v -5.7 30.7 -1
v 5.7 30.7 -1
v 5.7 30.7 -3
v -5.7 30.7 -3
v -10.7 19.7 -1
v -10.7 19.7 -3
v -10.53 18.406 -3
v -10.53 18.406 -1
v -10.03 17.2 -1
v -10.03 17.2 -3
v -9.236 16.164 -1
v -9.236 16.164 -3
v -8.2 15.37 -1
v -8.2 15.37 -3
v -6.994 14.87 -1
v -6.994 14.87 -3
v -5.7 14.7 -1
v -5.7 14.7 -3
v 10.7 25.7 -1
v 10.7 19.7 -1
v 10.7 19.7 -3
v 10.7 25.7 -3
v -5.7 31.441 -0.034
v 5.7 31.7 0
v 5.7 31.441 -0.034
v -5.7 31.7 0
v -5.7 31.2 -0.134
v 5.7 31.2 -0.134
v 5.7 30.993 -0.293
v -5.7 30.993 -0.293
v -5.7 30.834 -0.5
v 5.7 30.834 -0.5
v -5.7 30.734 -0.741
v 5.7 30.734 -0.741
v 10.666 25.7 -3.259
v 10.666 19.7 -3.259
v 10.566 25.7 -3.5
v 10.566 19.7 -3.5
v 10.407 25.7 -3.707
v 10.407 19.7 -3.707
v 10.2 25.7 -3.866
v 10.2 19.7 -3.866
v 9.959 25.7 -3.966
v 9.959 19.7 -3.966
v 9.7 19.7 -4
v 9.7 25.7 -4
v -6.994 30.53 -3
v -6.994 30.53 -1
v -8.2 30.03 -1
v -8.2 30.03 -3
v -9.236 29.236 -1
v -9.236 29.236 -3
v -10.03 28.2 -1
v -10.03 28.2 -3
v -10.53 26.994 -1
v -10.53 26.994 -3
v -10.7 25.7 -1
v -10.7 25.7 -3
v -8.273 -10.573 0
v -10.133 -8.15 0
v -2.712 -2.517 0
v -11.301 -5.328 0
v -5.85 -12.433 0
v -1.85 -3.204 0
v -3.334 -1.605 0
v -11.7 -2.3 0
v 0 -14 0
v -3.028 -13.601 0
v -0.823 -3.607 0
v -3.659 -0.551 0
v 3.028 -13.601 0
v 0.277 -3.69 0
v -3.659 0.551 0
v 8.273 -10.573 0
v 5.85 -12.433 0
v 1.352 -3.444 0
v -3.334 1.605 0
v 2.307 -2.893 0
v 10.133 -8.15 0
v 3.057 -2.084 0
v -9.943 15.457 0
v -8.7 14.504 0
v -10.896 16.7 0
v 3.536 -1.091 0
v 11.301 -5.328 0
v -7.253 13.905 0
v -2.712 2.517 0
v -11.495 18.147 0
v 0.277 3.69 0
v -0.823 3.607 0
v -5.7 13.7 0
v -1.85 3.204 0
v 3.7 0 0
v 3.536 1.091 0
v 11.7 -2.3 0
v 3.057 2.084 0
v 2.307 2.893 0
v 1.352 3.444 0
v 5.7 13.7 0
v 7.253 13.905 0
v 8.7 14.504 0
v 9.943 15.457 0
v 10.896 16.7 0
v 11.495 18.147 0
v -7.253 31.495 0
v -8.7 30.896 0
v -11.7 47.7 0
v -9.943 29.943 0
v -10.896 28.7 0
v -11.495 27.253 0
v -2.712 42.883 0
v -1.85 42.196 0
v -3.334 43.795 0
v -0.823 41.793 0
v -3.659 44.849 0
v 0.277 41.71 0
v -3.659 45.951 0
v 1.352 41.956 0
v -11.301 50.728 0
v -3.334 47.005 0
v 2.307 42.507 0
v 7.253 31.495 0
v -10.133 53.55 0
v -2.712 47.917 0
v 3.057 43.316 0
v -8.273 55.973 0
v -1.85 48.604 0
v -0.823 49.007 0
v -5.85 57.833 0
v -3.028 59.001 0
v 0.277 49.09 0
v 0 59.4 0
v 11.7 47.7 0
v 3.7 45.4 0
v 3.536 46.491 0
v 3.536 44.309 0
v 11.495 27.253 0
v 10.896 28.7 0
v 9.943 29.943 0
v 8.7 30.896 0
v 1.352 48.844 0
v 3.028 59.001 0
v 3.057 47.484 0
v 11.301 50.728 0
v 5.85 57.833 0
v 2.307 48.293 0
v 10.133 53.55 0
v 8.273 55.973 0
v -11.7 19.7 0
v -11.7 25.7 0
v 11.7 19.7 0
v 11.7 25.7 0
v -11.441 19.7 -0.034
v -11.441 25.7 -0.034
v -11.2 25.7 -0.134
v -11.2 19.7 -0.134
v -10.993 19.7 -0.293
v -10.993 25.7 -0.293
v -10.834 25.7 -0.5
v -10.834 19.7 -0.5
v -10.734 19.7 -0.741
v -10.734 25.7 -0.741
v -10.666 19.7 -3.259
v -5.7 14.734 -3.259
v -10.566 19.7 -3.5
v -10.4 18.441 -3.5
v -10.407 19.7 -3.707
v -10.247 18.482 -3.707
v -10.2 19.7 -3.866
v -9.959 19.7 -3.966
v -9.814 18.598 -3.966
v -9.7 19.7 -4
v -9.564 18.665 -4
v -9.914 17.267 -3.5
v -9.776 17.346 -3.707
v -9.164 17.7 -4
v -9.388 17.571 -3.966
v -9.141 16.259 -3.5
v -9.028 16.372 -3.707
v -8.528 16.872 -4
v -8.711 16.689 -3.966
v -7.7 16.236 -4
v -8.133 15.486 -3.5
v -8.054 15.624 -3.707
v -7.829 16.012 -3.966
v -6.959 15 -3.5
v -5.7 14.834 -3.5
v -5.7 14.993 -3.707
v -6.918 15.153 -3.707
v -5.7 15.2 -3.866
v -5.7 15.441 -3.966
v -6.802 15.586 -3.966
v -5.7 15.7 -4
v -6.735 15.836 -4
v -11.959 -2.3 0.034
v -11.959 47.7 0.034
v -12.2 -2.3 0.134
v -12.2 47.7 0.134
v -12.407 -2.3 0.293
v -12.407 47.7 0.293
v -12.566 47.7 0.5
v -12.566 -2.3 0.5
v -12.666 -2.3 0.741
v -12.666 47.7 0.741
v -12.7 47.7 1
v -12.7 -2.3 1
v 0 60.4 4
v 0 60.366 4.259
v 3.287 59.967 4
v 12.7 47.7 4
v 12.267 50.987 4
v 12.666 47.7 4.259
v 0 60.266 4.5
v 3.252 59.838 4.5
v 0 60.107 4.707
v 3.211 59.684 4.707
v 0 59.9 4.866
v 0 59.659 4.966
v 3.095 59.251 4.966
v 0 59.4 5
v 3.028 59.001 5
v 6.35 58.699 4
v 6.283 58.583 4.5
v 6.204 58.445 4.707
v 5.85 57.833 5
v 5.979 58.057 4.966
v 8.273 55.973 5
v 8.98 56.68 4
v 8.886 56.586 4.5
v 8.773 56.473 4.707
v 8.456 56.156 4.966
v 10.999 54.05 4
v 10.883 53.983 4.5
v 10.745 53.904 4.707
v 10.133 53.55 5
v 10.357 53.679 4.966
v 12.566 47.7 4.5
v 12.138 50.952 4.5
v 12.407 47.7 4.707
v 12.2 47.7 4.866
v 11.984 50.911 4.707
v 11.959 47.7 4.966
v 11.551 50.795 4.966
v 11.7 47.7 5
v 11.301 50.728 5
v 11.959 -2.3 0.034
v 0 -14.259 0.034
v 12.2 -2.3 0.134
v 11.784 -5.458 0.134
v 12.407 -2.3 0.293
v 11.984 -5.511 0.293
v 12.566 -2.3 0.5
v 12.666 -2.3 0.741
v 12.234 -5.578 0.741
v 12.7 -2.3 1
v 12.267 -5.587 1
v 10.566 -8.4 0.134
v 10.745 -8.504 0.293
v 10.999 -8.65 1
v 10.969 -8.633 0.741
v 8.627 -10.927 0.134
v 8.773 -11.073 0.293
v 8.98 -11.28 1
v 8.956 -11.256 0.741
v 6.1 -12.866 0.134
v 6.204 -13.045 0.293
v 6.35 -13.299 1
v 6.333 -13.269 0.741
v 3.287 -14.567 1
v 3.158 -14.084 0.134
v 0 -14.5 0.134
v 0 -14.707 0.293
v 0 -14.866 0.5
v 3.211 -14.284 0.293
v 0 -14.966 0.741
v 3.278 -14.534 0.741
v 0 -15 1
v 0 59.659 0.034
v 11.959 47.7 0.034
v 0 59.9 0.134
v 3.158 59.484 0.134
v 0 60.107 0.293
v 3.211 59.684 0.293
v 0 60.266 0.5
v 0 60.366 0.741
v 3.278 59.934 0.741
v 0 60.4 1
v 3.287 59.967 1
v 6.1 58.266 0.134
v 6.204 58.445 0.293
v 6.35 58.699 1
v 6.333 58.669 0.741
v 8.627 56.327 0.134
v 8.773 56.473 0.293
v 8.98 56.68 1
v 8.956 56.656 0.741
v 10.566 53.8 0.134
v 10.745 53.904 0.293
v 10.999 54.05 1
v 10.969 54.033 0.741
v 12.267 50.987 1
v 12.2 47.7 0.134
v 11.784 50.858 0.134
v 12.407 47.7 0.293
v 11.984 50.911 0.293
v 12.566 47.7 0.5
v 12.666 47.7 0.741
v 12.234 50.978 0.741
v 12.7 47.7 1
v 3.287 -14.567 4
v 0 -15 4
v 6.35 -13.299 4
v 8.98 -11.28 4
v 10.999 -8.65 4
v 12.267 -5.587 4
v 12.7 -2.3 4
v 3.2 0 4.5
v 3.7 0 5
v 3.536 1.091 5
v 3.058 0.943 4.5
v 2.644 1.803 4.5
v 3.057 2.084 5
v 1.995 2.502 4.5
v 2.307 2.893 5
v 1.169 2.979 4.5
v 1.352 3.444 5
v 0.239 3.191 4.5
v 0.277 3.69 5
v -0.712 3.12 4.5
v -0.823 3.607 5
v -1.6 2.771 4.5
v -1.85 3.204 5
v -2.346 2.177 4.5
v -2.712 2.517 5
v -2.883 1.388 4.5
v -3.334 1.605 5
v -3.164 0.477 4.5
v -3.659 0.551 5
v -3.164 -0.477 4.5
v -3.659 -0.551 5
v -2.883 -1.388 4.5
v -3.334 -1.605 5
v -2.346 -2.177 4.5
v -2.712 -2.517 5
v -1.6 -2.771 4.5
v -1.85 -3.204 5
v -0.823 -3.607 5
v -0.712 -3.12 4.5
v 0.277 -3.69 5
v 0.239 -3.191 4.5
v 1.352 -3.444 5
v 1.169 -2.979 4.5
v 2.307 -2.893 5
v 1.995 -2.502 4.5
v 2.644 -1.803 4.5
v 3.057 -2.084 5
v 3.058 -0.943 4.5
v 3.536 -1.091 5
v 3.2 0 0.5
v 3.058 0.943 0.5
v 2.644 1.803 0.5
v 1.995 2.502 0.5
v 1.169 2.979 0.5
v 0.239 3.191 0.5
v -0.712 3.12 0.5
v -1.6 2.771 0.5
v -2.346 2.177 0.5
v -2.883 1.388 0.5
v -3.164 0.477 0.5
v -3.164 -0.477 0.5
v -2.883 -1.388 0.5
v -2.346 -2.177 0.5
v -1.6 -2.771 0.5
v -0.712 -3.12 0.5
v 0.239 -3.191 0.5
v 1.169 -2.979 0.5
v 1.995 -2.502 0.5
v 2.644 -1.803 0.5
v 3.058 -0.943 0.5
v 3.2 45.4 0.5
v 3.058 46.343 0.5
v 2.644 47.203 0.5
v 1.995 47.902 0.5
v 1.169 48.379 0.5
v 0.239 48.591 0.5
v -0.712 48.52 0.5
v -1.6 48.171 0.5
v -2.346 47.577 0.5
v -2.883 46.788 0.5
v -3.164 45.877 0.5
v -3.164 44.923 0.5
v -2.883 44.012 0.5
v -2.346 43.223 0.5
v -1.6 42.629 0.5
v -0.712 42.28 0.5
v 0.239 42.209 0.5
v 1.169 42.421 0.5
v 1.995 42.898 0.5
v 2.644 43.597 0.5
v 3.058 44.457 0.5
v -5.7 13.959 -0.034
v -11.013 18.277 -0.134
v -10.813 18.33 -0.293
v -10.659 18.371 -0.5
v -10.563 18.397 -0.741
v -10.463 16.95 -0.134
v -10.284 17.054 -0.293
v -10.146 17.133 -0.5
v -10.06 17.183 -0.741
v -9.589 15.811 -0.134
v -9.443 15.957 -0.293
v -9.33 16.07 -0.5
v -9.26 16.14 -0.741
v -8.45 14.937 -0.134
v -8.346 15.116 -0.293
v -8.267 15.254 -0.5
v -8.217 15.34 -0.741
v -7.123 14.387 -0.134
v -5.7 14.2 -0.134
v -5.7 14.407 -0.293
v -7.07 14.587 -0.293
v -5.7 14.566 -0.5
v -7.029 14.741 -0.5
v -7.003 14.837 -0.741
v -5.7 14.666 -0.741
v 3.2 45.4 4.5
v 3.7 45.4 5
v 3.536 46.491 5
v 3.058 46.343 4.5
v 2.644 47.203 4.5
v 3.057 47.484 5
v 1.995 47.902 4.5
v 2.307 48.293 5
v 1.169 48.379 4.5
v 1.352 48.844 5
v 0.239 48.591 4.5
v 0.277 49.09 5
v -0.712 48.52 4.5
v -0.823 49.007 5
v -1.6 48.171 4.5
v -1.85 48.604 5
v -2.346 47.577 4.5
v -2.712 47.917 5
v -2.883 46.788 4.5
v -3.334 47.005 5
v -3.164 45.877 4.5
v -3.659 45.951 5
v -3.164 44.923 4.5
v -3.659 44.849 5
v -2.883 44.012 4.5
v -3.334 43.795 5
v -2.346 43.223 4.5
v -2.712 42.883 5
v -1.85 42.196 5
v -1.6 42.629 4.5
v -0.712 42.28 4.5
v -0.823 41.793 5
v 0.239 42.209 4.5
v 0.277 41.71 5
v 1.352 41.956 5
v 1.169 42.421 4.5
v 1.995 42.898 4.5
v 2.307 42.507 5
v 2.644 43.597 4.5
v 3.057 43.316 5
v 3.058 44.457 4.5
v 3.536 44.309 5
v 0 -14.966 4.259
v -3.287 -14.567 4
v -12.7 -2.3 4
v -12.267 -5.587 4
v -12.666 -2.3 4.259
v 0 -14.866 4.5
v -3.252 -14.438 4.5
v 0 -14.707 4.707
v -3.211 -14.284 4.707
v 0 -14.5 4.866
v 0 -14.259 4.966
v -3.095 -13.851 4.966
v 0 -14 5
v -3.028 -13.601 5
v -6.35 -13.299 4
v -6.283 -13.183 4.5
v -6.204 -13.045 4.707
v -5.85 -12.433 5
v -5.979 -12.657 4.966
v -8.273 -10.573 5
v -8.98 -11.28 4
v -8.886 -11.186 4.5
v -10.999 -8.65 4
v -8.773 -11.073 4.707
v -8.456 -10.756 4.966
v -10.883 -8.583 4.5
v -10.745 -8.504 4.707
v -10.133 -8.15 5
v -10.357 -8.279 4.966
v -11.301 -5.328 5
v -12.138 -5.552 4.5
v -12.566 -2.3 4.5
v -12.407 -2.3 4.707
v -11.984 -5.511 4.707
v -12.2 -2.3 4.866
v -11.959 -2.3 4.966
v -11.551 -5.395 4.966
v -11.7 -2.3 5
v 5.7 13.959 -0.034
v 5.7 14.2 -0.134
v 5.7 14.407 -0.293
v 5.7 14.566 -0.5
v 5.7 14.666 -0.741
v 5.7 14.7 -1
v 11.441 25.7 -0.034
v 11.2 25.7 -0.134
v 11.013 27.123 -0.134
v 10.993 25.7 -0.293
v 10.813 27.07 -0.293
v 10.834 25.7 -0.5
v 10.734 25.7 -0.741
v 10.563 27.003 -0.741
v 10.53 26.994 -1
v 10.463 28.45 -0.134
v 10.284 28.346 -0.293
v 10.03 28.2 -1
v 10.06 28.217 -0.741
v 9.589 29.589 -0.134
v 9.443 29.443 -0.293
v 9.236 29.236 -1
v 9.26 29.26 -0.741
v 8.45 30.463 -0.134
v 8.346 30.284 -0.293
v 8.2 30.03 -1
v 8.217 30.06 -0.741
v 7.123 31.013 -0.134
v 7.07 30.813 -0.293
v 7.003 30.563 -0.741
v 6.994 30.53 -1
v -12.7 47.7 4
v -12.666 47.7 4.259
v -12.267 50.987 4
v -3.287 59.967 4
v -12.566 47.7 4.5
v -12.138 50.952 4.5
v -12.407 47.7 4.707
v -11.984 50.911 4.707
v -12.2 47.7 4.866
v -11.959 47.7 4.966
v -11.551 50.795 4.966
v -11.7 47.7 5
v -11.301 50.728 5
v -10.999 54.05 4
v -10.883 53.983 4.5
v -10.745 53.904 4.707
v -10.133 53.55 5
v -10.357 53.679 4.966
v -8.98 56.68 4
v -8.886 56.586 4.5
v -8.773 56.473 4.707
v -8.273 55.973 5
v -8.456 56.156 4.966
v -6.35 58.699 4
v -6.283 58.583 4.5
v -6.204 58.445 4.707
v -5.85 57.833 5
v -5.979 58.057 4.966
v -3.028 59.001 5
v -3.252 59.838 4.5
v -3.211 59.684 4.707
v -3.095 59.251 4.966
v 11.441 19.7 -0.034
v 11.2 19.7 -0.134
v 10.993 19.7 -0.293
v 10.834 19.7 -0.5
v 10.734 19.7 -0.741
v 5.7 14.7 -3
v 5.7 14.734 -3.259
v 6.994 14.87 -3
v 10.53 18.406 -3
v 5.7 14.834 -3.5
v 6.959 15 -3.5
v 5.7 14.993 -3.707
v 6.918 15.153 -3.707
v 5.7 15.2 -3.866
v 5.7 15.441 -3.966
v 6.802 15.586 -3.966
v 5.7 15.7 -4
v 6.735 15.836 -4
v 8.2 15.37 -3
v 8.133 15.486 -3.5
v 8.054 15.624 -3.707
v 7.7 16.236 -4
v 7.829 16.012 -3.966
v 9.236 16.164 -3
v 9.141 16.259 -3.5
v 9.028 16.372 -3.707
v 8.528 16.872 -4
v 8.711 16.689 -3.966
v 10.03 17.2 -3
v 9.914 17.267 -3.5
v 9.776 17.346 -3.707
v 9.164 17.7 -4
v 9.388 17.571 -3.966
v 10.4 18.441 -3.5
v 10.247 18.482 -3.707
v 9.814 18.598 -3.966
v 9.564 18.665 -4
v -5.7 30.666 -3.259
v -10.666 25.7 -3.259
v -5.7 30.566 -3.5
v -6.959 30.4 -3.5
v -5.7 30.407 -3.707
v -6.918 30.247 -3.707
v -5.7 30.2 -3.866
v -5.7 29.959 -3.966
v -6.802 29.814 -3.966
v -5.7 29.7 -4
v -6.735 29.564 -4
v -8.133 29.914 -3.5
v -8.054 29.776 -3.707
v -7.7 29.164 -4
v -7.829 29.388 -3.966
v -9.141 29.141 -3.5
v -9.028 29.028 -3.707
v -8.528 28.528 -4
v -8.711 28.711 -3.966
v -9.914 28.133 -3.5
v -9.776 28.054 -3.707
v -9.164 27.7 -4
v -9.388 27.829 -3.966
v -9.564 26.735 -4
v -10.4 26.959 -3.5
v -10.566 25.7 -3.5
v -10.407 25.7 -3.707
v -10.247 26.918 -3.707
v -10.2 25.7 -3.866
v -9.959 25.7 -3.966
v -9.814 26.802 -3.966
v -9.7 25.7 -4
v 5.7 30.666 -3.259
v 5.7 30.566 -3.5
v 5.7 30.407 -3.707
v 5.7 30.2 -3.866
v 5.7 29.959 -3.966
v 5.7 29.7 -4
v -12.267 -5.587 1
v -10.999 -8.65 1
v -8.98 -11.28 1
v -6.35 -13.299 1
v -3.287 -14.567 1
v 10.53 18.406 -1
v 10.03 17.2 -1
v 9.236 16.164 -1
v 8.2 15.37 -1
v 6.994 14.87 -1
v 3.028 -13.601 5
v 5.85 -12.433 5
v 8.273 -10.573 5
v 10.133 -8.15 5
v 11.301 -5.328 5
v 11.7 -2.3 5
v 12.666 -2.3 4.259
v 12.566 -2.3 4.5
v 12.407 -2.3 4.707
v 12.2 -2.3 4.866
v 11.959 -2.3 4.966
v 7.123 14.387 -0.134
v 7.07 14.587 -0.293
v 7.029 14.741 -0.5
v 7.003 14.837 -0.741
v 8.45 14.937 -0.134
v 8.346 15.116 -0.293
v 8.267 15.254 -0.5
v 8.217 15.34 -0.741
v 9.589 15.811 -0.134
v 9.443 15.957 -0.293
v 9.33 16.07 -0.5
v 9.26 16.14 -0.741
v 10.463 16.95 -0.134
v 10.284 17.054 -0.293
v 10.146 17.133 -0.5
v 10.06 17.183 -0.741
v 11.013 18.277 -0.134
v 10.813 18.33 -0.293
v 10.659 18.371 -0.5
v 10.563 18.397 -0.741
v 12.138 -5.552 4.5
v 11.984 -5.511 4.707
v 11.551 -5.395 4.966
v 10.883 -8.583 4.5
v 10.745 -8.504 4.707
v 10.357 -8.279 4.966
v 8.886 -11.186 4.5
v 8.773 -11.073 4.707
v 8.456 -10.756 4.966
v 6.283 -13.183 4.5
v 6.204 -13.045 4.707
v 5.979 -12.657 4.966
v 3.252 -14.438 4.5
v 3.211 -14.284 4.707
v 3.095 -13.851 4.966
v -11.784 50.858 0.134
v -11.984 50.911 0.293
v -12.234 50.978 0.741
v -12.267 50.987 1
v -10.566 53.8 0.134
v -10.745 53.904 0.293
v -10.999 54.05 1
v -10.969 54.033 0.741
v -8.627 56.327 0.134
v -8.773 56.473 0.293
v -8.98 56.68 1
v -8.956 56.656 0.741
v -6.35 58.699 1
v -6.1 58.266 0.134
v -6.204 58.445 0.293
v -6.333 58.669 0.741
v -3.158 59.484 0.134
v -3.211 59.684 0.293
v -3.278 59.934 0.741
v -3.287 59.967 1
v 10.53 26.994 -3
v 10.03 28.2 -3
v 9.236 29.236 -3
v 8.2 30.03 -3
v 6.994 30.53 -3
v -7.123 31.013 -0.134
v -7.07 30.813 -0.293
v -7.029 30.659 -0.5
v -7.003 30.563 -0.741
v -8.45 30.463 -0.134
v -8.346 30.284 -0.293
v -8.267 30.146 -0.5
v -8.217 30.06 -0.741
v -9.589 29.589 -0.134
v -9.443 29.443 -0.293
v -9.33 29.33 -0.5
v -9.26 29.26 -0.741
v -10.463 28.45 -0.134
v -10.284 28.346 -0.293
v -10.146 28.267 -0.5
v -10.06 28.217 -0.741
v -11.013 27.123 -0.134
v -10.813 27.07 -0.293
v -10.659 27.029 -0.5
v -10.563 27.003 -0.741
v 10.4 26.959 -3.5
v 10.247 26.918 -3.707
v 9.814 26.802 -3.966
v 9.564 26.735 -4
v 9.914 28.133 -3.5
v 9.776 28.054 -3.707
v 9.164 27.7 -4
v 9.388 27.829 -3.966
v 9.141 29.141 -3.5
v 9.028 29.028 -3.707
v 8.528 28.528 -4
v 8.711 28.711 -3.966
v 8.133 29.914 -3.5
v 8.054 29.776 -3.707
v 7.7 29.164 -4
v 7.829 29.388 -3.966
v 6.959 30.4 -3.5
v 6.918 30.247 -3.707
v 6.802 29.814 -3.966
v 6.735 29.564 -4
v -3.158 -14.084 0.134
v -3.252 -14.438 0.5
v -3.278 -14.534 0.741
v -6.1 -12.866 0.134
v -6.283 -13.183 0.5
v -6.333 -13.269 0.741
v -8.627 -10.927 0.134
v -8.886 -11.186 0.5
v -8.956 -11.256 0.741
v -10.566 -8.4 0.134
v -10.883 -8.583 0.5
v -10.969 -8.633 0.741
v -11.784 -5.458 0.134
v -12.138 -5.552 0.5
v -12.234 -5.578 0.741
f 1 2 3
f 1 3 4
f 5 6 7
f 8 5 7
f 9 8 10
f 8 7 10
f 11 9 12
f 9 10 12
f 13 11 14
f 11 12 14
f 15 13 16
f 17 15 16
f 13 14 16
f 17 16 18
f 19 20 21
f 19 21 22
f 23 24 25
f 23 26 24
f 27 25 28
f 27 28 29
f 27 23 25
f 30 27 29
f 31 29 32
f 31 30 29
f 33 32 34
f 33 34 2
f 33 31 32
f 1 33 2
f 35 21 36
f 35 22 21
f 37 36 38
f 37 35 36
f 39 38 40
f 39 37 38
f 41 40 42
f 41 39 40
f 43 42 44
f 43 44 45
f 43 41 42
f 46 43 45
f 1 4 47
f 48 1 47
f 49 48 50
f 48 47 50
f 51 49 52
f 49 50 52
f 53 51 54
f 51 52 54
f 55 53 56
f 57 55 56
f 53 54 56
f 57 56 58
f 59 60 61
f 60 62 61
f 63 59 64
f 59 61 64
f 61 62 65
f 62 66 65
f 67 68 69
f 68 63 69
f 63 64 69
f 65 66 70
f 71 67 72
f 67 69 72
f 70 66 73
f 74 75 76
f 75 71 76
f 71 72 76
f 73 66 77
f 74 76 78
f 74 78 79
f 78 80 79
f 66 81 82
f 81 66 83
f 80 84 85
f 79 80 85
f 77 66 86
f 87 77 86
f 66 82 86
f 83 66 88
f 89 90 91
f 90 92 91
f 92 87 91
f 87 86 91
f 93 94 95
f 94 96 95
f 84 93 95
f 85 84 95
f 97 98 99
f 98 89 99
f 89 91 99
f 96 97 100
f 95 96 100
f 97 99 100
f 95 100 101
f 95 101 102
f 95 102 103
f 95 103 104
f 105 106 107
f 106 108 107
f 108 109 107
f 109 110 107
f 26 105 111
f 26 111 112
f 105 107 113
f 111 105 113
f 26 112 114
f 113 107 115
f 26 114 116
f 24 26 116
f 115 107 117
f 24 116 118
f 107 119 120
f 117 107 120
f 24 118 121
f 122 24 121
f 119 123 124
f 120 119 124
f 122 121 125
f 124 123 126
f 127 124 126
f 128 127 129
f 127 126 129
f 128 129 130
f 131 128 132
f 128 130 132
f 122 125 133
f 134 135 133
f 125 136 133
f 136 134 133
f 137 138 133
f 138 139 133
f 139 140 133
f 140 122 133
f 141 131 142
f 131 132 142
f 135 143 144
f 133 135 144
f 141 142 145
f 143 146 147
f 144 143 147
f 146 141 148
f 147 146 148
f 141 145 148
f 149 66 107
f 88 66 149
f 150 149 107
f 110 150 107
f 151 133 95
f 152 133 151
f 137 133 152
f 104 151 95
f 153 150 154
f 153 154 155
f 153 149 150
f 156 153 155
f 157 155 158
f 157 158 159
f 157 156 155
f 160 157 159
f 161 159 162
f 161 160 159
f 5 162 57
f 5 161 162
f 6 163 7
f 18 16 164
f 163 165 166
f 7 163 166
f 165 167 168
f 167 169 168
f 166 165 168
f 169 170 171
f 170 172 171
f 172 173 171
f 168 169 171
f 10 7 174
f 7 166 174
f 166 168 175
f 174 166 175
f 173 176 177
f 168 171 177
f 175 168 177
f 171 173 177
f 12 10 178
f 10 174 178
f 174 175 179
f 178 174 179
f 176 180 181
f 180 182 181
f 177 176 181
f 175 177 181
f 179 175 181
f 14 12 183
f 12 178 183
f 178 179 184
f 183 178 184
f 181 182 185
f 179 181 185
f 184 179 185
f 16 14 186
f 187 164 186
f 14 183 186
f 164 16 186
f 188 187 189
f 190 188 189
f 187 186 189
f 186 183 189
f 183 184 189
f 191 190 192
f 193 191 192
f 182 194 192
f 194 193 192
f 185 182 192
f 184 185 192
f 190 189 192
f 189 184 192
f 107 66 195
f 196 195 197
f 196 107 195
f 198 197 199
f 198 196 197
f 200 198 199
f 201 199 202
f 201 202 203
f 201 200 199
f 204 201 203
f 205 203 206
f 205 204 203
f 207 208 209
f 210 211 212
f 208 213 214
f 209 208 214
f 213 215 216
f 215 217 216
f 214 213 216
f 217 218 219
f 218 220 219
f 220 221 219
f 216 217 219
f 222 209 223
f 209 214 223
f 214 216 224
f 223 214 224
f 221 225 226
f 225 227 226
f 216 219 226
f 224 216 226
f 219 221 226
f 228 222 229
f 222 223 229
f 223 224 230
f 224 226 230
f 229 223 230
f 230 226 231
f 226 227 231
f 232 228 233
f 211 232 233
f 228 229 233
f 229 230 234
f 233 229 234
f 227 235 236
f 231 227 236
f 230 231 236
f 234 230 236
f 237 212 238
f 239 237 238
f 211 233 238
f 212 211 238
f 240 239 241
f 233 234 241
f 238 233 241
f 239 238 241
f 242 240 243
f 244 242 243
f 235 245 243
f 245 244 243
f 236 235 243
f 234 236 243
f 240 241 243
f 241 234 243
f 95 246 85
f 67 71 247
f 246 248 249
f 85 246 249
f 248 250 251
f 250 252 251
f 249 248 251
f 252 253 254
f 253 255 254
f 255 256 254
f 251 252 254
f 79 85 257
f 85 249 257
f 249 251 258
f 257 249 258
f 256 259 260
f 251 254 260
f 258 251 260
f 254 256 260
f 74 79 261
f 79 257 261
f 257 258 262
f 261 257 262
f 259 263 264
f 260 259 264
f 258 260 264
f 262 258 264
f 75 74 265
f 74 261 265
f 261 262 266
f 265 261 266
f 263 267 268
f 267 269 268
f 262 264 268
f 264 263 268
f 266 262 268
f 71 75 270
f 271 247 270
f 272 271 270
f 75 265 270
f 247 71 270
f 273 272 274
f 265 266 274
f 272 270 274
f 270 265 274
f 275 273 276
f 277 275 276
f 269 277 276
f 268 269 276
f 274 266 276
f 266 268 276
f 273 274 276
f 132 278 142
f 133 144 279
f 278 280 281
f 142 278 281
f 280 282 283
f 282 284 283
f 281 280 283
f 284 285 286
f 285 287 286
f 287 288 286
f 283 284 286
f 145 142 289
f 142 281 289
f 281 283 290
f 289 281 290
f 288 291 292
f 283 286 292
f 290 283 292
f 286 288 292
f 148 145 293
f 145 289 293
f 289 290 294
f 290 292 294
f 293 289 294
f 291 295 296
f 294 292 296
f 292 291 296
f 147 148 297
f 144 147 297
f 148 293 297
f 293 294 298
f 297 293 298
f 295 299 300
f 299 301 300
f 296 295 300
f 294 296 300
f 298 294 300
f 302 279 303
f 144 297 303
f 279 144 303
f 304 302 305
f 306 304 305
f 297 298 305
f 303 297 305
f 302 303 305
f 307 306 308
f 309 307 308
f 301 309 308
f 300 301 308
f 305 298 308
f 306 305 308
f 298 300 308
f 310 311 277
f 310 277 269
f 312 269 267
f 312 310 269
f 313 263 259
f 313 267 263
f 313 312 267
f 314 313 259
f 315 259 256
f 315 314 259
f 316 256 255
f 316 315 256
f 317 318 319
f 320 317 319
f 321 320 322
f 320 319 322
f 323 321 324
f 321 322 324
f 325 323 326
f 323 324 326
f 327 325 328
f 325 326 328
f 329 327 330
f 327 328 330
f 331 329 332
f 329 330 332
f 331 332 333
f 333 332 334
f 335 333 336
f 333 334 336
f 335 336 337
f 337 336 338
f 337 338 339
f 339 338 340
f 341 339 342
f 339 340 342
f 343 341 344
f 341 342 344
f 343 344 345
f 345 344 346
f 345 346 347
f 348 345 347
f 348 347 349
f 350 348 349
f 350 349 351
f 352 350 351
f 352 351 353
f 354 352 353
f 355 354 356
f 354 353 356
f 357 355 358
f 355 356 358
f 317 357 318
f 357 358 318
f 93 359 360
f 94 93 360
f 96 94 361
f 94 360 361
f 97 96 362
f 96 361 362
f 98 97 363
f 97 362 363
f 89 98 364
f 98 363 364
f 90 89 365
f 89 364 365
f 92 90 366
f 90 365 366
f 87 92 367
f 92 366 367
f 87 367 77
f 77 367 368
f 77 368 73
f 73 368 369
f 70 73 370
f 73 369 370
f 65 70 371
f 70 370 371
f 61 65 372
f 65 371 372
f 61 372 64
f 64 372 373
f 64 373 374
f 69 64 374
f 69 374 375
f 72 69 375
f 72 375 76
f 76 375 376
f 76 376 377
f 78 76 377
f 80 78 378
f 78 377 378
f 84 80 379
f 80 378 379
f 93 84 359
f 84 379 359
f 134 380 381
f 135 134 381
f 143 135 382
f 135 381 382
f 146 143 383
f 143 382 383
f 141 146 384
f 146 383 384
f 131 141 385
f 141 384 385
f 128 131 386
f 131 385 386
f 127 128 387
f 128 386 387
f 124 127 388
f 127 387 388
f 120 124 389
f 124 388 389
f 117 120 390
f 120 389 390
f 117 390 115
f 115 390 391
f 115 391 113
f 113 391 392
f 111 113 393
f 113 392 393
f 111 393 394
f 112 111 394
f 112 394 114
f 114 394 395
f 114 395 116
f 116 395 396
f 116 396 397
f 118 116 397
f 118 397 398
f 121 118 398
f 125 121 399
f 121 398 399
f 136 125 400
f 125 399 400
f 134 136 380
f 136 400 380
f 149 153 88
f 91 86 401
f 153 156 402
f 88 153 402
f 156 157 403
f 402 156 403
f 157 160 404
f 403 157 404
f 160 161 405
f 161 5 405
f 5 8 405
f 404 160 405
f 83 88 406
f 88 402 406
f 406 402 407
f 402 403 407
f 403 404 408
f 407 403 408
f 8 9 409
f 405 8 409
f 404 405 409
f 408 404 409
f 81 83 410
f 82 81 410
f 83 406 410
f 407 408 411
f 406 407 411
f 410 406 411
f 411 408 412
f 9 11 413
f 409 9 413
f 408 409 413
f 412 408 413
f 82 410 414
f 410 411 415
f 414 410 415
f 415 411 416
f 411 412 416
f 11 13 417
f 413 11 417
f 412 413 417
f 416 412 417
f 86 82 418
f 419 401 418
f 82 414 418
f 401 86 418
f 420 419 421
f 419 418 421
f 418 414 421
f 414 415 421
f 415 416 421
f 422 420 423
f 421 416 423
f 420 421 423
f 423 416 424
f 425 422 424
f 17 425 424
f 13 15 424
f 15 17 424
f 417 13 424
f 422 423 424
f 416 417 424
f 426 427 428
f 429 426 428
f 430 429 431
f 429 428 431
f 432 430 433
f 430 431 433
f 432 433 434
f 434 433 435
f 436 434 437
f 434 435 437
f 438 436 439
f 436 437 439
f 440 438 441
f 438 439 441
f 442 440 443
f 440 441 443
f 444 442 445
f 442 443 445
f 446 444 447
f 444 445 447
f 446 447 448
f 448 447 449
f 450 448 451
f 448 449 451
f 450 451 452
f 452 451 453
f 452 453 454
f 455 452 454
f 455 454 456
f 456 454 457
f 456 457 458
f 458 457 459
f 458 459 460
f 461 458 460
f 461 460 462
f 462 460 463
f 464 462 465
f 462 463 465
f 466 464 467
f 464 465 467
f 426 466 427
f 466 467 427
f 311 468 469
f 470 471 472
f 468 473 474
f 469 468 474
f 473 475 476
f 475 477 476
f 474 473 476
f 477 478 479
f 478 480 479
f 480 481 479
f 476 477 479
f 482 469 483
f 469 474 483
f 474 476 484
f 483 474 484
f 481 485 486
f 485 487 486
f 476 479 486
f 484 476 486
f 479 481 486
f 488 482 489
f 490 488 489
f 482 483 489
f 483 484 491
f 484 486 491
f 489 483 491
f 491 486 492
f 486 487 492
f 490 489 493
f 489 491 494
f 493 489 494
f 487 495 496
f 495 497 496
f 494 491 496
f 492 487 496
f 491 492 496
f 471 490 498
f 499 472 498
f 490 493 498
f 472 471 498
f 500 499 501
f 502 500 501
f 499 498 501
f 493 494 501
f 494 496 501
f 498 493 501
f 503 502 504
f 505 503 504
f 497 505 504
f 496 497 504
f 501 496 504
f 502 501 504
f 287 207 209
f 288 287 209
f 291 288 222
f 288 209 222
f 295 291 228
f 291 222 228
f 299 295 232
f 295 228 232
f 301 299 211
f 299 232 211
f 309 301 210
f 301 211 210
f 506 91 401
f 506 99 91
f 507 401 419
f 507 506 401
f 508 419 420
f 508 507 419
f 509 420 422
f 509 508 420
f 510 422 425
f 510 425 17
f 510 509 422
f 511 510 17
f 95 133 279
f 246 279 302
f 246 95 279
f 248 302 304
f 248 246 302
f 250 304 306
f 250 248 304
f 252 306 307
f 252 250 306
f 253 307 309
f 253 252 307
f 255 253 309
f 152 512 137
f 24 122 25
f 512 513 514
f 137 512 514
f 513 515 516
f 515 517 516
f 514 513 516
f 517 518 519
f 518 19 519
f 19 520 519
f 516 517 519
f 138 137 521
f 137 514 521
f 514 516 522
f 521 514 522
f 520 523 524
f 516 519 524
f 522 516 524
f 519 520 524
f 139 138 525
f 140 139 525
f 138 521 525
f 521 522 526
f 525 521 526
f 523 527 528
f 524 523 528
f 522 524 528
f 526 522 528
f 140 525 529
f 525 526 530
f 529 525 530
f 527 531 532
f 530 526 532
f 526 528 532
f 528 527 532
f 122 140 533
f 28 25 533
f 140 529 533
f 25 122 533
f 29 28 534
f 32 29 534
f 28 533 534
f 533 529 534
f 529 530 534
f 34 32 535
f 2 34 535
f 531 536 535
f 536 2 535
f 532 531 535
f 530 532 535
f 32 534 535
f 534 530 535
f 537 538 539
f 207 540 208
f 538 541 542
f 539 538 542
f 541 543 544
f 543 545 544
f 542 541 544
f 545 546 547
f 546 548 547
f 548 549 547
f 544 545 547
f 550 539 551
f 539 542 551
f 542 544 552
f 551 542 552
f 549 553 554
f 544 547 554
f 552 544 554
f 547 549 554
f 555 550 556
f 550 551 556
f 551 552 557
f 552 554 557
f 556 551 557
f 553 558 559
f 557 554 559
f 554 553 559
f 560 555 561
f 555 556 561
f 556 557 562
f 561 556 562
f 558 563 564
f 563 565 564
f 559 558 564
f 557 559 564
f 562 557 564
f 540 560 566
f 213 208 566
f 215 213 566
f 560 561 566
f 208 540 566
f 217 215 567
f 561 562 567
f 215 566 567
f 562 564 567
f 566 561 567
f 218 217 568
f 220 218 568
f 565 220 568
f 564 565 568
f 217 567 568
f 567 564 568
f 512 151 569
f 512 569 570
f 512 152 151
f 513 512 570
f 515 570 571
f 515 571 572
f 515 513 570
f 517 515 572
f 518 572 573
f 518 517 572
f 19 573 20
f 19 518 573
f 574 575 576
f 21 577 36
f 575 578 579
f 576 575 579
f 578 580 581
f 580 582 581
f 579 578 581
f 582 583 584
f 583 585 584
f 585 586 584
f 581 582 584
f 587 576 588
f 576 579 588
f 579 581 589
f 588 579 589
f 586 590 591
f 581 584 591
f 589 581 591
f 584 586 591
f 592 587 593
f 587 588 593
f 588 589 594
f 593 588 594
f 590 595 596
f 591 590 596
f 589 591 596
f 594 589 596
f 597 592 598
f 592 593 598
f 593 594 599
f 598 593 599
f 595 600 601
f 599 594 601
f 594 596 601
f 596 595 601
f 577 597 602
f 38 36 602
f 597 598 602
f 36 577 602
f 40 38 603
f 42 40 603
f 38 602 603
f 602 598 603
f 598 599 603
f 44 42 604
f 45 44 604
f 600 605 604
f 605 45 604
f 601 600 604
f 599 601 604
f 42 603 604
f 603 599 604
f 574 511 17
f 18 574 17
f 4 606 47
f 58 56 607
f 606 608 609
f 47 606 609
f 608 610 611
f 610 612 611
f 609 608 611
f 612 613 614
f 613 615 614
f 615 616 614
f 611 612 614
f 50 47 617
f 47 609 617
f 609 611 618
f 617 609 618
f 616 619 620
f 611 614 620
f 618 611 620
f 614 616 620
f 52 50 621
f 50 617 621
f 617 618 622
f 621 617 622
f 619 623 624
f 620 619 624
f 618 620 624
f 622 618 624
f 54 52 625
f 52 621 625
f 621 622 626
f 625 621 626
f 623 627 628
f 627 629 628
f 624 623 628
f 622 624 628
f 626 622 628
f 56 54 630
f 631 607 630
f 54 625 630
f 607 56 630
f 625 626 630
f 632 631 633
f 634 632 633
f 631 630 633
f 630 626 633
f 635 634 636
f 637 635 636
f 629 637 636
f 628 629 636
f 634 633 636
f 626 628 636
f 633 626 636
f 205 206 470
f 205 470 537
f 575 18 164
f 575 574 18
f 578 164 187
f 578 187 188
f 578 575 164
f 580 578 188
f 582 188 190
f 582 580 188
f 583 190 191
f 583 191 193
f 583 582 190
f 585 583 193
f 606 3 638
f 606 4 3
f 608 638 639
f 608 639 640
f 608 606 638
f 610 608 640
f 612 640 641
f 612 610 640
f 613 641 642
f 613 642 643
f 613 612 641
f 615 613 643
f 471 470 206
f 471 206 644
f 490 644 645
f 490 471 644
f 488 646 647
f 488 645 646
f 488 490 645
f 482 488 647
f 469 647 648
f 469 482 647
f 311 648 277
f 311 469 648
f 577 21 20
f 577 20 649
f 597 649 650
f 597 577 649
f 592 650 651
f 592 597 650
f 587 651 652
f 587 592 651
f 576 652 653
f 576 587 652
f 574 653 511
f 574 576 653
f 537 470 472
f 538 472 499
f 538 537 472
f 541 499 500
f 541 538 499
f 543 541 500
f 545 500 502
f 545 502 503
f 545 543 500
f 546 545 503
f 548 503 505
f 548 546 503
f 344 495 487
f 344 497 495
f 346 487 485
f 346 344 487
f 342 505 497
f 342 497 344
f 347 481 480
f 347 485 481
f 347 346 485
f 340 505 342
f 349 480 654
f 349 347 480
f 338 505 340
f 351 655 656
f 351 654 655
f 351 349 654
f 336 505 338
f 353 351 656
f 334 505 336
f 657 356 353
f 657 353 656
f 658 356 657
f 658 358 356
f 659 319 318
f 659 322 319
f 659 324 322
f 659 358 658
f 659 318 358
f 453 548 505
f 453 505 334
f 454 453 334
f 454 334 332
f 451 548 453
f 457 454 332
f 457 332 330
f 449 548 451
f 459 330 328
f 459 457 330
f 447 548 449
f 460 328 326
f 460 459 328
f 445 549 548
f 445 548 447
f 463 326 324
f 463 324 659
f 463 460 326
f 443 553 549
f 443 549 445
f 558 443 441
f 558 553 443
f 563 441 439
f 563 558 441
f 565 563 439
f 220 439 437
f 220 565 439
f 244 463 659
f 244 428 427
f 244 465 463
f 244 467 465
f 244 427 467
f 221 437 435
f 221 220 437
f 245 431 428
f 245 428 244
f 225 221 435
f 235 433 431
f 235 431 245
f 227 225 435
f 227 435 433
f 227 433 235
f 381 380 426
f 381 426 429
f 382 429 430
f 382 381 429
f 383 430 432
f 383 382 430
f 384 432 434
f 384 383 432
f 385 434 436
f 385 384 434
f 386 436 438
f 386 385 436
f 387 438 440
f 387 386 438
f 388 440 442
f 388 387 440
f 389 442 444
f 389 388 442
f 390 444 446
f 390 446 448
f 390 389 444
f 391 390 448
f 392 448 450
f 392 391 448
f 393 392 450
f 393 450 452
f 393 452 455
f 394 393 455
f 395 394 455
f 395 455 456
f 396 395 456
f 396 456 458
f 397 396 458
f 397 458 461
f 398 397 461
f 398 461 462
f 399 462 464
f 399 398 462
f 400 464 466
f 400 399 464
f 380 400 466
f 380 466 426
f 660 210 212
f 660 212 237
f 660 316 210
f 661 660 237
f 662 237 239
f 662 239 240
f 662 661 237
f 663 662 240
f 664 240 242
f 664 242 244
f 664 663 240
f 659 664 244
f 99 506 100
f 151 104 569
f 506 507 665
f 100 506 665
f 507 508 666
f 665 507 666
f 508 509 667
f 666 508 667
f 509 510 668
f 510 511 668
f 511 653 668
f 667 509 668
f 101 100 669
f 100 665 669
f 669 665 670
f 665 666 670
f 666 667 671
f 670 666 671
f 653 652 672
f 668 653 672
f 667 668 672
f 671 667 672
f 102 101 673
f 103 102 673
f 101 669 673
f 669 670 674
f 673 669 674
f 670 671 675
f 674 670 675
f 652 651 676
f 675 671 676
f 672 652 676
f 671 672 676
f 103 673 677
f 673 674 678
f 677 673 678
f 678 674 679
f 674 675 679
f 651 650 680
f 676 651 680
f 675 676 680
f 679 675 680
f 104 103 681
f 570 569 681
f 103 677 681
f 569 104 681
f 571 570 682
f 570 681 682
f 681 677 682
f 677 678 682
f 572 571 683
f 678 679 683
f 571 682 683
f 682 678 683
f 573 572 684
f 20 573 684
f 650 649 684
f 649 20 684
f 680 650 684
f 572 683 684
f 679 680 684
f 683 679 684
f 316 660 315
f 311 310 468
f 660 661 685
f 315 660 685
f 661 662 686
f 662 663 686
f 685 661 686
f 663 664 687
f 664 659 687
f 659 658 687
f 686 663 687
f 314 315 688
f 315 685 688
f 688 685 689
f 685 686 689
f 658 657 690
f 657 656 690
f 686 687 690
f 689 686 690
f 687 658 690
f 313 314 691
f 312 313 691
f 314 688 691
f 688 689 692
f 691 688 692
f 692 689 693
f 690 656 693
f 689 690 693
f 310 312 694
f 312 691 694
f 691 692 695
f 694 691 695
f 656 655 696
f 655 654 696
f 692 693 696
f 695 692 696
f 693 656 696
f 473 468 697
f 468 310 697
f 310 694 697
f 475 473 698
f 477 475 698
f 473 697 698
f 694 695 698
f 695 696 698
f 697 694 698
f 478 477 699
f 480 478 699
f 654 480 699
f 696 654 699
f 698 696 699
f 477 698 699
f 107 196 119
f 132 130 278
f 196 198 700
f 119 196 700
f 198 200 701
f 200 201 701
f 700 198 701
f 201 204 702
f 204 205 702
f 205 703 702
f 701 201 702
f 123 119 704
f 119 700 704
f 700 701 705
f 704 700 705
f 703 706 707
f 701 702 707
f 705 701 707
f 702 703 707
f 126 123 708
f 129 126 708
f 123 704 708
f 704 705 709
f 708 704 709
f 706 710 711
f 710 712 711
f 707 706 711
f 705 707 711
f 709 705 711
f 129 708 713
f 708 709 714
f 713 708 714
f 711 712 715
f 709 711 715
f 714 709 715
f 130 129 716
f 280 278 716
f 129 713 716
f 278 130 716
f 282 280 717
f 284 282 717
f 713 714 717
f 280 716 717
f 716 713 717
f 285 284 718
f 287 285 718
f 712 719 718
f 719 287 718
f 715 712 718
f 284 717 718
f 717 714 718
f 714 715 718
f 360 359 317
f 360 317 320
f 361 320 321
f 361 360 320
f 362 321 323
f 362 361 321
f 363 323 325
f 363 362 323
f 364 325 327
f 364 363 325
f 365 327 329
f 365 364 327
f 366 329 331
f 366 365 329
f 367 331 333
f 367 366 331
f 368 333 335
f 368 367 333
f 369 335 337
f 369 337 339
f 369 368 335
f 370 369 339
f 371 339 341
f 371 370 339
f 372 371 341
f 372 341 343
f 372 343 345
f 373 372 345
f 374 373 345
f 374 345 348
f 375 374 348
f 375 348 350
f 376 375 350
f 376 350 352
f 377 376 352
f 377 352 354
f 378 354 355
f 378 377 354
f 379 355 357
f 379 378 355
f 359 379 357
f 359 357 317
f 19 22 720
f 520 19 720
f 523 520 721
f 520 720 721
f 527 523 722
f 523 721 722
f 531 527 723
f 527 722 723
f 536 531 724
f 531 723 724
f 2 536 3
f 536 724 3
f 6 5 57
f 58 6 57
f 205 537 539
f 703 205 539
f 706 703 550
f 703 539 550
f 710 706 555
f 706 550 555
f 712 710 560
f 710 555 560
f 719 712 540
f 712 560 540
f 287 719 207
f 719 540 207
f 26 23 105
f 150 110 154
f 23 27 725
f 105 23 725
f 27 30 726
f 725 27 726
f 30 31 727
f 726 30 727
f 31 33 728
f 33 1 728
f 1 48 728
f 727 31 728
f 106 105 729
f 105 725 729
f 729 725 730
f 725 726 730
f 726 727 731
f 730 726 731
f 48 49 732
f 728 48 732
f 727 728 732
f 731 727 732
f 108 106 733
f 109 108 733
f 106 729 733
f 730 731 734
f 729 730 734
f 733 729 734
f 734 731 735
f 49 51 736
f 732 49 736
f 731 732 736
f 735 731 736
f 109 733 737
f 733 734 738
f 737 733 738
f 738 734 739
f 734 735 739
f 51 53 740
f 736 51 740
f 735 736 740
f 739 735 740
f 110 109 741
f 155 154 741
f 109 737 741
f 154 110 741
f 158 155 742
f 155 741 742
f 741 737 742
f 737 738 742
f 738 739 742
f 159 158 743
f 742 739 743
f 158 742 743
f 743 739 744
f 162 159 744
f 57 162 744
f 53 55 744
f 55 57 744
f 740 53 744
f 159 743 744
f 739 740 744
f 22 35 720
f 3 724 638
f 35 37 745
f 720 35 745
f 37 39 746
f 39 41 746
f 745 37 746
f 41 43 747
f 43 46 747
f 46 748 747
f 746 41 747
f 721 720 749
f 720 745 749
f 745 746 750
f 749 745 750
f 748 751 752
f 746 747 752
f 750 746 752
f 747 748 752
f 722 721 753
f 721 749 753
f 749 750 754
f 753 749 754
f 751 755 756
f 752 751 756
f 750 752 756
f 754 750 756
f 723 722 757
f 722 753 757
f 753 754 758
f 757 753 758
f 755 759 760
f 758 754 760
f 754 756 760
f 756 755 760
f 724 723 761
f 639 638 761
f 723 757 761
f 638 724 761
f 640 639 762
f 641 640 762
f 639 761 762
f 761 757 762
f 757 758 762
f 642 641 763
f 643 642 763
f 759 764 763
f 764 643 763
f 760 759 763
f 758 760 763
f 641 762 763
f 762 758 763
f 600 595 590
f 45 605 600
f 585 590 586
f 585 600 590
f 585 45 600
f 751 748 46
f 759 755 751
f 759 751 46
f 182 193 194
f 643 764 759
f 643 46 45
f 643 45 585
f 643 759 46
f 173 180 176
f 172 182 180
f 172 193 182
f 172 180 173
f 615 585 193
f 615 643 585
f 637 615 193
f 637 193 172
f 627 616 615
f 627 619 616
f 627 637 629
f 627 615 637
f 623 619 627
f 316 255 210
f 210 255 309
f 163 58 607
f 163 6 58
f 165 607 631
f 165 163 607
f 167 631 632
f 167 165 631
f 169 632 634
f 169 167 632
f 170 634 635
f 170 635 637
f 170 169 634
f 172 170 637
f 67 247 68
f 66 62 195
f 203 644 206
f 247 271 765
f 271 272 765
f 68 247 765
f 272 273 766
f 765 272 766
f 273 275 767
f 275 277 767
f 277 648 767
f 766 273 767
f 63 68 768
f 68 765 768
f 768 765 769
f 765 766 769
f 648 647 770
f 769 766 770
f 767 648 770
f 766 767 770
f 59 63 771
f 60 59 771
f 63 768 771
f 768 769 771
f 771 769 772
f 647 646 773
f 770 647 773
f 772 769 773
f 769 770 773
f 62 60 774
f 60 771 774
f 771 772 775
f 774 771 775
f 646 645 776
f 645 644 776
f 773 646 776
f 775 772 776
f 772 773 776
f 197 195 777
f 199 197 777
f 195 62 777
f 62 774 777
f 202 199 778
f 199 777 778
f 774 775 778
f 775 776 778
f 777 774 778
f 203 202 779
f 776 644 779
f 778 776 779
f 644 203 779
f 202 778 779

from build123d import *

# Parameters (mm, degrees)
SKETCH1_W        = 25.4
SKETCH1_H        = 75.4
SKETCH1_R        = 3.2
MAINBODY_DEPTH   = 5
SKETCH2_W        = 21.4
SKETCH2_H        = 16
RIBSUPPORT_DEPTH = 4
FILLET_12_7_R    = 12.7
FILLET_5_0_R     = 5
CHAMFER_0_5_SIZE = 0.5
FILLET_1_0_R     = 1


with BuildPart() as part:
    # Sketch1 → mainBody (new body)
    with BuildSketch(Plane.XY):
        with Locations((0, 22.7)):
            Rectangle(SKETCH1_W, SKETCH1_H)
        Circle(SKETCH1_R, mode=Mode.SUBTRACT)
        with Locations((0, 45.4)):
            Circle(SKETCH1_R, mode=Mode.SUBTRACT)
    extrude(amount=MAINBODY_DEPTH)

    # Sketch2 → ribSupport (add)
    with BuildSketch(Plane(origin=(0, 0, 0), x_dir=(-1, 0, 0), z_dir=(0, 0, -1))):
        with Locations((0, 22.7)):
            Rectangle(SKETCH2_W, SKETCH2_H)
    extrude(amount=RIBSUPPORT_DEPTH)

    # Fillet-12.7
    fillet_12_7_edges = [part.edges().sort_by_distance(p)[0] for p in [
        (-12.7, -15, 2.5),
        (12.7, -15, 2.5),
        (-12.7, 60.4, 2.5),
        (12.7, 60.4, 2.5),
    ]]
    fillet(fillet_12_7_edges, radius=FILLET_12_7_R - 0.0001)  # a hair under: the kernel refuses the full size

    # Fillet-5.0
    fillet_5_0_edges = [part.edges().sort_by_distance(p)[0] for p in [
        (10.7, 30.7, -2),
        (10.7, 14.7, -2),
        (-10.7, 14.7, -2),
        (-10.7, 30.7, -2),
    ]]
    fillet(fillet_5_0_edges, radius=FILLET_5_0_R)

    # Chamfer-0.5
    chamfer_0_5_edges = [part.edges().sort_by_distance(p)[0] for p in [
        (-3.2, 0, 0),
        (-3.2, 0, 5),
        (-3.2, 45.4, 0),
        (-3.2, 45.4, 5),
    ]]
    chamfer(chamfer_0_5_edges, length=CHAMFER_0_5_SIZE)

    # Fillet-1.0
    fillet_1_0_edges = [part.edges().sort_by_distance(p)[0] for p in [
        (-12.7, 22.7, 0),
        (12.7, 22.7, 0),
        (8.98028541, 56.68028541, 0),
        (-8.98028541, 56.68028541, 0),
        (8.98028541, -11.28028541, 0),
        (-8.98028541, -11.28028541, 0),
        (-12.7, 22.7, 5),
        (12.7, 22.7, 5),
        (8.98028541, 56.68028541, 5),
        (-8.98028541, 56.68028541, 5),
        (8.98028541, -11.28028541, 5),
        (-8.98028541, -11.28028541, 5),
        (0, 30.7, 0),
        (0, 30.7, -4),
        (-10.7, 22.7, 0),
        (-10.7, 22.7, -4),
        (10.7, 22.7, -4),
        (0, 14.7, -4),
        (9.235533906, 29.235533906, -4),
        (9.235533906, 16.164466094, -4),
        (-9.235533906, 16.164466094, -4),
        (-9.235533906, 29.235533906, -4),
        (0, 14.7, 0),
        (10.7, 22.7, 0),
        (-9.235533906, 29.235533906, 0),
        (-9.235533906, 16.164466094, 0),
        (9.235533906, 16.164466094, 0),
        (9.235533906, 29.235533906, 0),
    ]]
    fillet(fillet_1_0_edges, radius=FILLET_1_0_R - 0.0001)  # a hair under: the kernel refuses the full size


solid = part.part
